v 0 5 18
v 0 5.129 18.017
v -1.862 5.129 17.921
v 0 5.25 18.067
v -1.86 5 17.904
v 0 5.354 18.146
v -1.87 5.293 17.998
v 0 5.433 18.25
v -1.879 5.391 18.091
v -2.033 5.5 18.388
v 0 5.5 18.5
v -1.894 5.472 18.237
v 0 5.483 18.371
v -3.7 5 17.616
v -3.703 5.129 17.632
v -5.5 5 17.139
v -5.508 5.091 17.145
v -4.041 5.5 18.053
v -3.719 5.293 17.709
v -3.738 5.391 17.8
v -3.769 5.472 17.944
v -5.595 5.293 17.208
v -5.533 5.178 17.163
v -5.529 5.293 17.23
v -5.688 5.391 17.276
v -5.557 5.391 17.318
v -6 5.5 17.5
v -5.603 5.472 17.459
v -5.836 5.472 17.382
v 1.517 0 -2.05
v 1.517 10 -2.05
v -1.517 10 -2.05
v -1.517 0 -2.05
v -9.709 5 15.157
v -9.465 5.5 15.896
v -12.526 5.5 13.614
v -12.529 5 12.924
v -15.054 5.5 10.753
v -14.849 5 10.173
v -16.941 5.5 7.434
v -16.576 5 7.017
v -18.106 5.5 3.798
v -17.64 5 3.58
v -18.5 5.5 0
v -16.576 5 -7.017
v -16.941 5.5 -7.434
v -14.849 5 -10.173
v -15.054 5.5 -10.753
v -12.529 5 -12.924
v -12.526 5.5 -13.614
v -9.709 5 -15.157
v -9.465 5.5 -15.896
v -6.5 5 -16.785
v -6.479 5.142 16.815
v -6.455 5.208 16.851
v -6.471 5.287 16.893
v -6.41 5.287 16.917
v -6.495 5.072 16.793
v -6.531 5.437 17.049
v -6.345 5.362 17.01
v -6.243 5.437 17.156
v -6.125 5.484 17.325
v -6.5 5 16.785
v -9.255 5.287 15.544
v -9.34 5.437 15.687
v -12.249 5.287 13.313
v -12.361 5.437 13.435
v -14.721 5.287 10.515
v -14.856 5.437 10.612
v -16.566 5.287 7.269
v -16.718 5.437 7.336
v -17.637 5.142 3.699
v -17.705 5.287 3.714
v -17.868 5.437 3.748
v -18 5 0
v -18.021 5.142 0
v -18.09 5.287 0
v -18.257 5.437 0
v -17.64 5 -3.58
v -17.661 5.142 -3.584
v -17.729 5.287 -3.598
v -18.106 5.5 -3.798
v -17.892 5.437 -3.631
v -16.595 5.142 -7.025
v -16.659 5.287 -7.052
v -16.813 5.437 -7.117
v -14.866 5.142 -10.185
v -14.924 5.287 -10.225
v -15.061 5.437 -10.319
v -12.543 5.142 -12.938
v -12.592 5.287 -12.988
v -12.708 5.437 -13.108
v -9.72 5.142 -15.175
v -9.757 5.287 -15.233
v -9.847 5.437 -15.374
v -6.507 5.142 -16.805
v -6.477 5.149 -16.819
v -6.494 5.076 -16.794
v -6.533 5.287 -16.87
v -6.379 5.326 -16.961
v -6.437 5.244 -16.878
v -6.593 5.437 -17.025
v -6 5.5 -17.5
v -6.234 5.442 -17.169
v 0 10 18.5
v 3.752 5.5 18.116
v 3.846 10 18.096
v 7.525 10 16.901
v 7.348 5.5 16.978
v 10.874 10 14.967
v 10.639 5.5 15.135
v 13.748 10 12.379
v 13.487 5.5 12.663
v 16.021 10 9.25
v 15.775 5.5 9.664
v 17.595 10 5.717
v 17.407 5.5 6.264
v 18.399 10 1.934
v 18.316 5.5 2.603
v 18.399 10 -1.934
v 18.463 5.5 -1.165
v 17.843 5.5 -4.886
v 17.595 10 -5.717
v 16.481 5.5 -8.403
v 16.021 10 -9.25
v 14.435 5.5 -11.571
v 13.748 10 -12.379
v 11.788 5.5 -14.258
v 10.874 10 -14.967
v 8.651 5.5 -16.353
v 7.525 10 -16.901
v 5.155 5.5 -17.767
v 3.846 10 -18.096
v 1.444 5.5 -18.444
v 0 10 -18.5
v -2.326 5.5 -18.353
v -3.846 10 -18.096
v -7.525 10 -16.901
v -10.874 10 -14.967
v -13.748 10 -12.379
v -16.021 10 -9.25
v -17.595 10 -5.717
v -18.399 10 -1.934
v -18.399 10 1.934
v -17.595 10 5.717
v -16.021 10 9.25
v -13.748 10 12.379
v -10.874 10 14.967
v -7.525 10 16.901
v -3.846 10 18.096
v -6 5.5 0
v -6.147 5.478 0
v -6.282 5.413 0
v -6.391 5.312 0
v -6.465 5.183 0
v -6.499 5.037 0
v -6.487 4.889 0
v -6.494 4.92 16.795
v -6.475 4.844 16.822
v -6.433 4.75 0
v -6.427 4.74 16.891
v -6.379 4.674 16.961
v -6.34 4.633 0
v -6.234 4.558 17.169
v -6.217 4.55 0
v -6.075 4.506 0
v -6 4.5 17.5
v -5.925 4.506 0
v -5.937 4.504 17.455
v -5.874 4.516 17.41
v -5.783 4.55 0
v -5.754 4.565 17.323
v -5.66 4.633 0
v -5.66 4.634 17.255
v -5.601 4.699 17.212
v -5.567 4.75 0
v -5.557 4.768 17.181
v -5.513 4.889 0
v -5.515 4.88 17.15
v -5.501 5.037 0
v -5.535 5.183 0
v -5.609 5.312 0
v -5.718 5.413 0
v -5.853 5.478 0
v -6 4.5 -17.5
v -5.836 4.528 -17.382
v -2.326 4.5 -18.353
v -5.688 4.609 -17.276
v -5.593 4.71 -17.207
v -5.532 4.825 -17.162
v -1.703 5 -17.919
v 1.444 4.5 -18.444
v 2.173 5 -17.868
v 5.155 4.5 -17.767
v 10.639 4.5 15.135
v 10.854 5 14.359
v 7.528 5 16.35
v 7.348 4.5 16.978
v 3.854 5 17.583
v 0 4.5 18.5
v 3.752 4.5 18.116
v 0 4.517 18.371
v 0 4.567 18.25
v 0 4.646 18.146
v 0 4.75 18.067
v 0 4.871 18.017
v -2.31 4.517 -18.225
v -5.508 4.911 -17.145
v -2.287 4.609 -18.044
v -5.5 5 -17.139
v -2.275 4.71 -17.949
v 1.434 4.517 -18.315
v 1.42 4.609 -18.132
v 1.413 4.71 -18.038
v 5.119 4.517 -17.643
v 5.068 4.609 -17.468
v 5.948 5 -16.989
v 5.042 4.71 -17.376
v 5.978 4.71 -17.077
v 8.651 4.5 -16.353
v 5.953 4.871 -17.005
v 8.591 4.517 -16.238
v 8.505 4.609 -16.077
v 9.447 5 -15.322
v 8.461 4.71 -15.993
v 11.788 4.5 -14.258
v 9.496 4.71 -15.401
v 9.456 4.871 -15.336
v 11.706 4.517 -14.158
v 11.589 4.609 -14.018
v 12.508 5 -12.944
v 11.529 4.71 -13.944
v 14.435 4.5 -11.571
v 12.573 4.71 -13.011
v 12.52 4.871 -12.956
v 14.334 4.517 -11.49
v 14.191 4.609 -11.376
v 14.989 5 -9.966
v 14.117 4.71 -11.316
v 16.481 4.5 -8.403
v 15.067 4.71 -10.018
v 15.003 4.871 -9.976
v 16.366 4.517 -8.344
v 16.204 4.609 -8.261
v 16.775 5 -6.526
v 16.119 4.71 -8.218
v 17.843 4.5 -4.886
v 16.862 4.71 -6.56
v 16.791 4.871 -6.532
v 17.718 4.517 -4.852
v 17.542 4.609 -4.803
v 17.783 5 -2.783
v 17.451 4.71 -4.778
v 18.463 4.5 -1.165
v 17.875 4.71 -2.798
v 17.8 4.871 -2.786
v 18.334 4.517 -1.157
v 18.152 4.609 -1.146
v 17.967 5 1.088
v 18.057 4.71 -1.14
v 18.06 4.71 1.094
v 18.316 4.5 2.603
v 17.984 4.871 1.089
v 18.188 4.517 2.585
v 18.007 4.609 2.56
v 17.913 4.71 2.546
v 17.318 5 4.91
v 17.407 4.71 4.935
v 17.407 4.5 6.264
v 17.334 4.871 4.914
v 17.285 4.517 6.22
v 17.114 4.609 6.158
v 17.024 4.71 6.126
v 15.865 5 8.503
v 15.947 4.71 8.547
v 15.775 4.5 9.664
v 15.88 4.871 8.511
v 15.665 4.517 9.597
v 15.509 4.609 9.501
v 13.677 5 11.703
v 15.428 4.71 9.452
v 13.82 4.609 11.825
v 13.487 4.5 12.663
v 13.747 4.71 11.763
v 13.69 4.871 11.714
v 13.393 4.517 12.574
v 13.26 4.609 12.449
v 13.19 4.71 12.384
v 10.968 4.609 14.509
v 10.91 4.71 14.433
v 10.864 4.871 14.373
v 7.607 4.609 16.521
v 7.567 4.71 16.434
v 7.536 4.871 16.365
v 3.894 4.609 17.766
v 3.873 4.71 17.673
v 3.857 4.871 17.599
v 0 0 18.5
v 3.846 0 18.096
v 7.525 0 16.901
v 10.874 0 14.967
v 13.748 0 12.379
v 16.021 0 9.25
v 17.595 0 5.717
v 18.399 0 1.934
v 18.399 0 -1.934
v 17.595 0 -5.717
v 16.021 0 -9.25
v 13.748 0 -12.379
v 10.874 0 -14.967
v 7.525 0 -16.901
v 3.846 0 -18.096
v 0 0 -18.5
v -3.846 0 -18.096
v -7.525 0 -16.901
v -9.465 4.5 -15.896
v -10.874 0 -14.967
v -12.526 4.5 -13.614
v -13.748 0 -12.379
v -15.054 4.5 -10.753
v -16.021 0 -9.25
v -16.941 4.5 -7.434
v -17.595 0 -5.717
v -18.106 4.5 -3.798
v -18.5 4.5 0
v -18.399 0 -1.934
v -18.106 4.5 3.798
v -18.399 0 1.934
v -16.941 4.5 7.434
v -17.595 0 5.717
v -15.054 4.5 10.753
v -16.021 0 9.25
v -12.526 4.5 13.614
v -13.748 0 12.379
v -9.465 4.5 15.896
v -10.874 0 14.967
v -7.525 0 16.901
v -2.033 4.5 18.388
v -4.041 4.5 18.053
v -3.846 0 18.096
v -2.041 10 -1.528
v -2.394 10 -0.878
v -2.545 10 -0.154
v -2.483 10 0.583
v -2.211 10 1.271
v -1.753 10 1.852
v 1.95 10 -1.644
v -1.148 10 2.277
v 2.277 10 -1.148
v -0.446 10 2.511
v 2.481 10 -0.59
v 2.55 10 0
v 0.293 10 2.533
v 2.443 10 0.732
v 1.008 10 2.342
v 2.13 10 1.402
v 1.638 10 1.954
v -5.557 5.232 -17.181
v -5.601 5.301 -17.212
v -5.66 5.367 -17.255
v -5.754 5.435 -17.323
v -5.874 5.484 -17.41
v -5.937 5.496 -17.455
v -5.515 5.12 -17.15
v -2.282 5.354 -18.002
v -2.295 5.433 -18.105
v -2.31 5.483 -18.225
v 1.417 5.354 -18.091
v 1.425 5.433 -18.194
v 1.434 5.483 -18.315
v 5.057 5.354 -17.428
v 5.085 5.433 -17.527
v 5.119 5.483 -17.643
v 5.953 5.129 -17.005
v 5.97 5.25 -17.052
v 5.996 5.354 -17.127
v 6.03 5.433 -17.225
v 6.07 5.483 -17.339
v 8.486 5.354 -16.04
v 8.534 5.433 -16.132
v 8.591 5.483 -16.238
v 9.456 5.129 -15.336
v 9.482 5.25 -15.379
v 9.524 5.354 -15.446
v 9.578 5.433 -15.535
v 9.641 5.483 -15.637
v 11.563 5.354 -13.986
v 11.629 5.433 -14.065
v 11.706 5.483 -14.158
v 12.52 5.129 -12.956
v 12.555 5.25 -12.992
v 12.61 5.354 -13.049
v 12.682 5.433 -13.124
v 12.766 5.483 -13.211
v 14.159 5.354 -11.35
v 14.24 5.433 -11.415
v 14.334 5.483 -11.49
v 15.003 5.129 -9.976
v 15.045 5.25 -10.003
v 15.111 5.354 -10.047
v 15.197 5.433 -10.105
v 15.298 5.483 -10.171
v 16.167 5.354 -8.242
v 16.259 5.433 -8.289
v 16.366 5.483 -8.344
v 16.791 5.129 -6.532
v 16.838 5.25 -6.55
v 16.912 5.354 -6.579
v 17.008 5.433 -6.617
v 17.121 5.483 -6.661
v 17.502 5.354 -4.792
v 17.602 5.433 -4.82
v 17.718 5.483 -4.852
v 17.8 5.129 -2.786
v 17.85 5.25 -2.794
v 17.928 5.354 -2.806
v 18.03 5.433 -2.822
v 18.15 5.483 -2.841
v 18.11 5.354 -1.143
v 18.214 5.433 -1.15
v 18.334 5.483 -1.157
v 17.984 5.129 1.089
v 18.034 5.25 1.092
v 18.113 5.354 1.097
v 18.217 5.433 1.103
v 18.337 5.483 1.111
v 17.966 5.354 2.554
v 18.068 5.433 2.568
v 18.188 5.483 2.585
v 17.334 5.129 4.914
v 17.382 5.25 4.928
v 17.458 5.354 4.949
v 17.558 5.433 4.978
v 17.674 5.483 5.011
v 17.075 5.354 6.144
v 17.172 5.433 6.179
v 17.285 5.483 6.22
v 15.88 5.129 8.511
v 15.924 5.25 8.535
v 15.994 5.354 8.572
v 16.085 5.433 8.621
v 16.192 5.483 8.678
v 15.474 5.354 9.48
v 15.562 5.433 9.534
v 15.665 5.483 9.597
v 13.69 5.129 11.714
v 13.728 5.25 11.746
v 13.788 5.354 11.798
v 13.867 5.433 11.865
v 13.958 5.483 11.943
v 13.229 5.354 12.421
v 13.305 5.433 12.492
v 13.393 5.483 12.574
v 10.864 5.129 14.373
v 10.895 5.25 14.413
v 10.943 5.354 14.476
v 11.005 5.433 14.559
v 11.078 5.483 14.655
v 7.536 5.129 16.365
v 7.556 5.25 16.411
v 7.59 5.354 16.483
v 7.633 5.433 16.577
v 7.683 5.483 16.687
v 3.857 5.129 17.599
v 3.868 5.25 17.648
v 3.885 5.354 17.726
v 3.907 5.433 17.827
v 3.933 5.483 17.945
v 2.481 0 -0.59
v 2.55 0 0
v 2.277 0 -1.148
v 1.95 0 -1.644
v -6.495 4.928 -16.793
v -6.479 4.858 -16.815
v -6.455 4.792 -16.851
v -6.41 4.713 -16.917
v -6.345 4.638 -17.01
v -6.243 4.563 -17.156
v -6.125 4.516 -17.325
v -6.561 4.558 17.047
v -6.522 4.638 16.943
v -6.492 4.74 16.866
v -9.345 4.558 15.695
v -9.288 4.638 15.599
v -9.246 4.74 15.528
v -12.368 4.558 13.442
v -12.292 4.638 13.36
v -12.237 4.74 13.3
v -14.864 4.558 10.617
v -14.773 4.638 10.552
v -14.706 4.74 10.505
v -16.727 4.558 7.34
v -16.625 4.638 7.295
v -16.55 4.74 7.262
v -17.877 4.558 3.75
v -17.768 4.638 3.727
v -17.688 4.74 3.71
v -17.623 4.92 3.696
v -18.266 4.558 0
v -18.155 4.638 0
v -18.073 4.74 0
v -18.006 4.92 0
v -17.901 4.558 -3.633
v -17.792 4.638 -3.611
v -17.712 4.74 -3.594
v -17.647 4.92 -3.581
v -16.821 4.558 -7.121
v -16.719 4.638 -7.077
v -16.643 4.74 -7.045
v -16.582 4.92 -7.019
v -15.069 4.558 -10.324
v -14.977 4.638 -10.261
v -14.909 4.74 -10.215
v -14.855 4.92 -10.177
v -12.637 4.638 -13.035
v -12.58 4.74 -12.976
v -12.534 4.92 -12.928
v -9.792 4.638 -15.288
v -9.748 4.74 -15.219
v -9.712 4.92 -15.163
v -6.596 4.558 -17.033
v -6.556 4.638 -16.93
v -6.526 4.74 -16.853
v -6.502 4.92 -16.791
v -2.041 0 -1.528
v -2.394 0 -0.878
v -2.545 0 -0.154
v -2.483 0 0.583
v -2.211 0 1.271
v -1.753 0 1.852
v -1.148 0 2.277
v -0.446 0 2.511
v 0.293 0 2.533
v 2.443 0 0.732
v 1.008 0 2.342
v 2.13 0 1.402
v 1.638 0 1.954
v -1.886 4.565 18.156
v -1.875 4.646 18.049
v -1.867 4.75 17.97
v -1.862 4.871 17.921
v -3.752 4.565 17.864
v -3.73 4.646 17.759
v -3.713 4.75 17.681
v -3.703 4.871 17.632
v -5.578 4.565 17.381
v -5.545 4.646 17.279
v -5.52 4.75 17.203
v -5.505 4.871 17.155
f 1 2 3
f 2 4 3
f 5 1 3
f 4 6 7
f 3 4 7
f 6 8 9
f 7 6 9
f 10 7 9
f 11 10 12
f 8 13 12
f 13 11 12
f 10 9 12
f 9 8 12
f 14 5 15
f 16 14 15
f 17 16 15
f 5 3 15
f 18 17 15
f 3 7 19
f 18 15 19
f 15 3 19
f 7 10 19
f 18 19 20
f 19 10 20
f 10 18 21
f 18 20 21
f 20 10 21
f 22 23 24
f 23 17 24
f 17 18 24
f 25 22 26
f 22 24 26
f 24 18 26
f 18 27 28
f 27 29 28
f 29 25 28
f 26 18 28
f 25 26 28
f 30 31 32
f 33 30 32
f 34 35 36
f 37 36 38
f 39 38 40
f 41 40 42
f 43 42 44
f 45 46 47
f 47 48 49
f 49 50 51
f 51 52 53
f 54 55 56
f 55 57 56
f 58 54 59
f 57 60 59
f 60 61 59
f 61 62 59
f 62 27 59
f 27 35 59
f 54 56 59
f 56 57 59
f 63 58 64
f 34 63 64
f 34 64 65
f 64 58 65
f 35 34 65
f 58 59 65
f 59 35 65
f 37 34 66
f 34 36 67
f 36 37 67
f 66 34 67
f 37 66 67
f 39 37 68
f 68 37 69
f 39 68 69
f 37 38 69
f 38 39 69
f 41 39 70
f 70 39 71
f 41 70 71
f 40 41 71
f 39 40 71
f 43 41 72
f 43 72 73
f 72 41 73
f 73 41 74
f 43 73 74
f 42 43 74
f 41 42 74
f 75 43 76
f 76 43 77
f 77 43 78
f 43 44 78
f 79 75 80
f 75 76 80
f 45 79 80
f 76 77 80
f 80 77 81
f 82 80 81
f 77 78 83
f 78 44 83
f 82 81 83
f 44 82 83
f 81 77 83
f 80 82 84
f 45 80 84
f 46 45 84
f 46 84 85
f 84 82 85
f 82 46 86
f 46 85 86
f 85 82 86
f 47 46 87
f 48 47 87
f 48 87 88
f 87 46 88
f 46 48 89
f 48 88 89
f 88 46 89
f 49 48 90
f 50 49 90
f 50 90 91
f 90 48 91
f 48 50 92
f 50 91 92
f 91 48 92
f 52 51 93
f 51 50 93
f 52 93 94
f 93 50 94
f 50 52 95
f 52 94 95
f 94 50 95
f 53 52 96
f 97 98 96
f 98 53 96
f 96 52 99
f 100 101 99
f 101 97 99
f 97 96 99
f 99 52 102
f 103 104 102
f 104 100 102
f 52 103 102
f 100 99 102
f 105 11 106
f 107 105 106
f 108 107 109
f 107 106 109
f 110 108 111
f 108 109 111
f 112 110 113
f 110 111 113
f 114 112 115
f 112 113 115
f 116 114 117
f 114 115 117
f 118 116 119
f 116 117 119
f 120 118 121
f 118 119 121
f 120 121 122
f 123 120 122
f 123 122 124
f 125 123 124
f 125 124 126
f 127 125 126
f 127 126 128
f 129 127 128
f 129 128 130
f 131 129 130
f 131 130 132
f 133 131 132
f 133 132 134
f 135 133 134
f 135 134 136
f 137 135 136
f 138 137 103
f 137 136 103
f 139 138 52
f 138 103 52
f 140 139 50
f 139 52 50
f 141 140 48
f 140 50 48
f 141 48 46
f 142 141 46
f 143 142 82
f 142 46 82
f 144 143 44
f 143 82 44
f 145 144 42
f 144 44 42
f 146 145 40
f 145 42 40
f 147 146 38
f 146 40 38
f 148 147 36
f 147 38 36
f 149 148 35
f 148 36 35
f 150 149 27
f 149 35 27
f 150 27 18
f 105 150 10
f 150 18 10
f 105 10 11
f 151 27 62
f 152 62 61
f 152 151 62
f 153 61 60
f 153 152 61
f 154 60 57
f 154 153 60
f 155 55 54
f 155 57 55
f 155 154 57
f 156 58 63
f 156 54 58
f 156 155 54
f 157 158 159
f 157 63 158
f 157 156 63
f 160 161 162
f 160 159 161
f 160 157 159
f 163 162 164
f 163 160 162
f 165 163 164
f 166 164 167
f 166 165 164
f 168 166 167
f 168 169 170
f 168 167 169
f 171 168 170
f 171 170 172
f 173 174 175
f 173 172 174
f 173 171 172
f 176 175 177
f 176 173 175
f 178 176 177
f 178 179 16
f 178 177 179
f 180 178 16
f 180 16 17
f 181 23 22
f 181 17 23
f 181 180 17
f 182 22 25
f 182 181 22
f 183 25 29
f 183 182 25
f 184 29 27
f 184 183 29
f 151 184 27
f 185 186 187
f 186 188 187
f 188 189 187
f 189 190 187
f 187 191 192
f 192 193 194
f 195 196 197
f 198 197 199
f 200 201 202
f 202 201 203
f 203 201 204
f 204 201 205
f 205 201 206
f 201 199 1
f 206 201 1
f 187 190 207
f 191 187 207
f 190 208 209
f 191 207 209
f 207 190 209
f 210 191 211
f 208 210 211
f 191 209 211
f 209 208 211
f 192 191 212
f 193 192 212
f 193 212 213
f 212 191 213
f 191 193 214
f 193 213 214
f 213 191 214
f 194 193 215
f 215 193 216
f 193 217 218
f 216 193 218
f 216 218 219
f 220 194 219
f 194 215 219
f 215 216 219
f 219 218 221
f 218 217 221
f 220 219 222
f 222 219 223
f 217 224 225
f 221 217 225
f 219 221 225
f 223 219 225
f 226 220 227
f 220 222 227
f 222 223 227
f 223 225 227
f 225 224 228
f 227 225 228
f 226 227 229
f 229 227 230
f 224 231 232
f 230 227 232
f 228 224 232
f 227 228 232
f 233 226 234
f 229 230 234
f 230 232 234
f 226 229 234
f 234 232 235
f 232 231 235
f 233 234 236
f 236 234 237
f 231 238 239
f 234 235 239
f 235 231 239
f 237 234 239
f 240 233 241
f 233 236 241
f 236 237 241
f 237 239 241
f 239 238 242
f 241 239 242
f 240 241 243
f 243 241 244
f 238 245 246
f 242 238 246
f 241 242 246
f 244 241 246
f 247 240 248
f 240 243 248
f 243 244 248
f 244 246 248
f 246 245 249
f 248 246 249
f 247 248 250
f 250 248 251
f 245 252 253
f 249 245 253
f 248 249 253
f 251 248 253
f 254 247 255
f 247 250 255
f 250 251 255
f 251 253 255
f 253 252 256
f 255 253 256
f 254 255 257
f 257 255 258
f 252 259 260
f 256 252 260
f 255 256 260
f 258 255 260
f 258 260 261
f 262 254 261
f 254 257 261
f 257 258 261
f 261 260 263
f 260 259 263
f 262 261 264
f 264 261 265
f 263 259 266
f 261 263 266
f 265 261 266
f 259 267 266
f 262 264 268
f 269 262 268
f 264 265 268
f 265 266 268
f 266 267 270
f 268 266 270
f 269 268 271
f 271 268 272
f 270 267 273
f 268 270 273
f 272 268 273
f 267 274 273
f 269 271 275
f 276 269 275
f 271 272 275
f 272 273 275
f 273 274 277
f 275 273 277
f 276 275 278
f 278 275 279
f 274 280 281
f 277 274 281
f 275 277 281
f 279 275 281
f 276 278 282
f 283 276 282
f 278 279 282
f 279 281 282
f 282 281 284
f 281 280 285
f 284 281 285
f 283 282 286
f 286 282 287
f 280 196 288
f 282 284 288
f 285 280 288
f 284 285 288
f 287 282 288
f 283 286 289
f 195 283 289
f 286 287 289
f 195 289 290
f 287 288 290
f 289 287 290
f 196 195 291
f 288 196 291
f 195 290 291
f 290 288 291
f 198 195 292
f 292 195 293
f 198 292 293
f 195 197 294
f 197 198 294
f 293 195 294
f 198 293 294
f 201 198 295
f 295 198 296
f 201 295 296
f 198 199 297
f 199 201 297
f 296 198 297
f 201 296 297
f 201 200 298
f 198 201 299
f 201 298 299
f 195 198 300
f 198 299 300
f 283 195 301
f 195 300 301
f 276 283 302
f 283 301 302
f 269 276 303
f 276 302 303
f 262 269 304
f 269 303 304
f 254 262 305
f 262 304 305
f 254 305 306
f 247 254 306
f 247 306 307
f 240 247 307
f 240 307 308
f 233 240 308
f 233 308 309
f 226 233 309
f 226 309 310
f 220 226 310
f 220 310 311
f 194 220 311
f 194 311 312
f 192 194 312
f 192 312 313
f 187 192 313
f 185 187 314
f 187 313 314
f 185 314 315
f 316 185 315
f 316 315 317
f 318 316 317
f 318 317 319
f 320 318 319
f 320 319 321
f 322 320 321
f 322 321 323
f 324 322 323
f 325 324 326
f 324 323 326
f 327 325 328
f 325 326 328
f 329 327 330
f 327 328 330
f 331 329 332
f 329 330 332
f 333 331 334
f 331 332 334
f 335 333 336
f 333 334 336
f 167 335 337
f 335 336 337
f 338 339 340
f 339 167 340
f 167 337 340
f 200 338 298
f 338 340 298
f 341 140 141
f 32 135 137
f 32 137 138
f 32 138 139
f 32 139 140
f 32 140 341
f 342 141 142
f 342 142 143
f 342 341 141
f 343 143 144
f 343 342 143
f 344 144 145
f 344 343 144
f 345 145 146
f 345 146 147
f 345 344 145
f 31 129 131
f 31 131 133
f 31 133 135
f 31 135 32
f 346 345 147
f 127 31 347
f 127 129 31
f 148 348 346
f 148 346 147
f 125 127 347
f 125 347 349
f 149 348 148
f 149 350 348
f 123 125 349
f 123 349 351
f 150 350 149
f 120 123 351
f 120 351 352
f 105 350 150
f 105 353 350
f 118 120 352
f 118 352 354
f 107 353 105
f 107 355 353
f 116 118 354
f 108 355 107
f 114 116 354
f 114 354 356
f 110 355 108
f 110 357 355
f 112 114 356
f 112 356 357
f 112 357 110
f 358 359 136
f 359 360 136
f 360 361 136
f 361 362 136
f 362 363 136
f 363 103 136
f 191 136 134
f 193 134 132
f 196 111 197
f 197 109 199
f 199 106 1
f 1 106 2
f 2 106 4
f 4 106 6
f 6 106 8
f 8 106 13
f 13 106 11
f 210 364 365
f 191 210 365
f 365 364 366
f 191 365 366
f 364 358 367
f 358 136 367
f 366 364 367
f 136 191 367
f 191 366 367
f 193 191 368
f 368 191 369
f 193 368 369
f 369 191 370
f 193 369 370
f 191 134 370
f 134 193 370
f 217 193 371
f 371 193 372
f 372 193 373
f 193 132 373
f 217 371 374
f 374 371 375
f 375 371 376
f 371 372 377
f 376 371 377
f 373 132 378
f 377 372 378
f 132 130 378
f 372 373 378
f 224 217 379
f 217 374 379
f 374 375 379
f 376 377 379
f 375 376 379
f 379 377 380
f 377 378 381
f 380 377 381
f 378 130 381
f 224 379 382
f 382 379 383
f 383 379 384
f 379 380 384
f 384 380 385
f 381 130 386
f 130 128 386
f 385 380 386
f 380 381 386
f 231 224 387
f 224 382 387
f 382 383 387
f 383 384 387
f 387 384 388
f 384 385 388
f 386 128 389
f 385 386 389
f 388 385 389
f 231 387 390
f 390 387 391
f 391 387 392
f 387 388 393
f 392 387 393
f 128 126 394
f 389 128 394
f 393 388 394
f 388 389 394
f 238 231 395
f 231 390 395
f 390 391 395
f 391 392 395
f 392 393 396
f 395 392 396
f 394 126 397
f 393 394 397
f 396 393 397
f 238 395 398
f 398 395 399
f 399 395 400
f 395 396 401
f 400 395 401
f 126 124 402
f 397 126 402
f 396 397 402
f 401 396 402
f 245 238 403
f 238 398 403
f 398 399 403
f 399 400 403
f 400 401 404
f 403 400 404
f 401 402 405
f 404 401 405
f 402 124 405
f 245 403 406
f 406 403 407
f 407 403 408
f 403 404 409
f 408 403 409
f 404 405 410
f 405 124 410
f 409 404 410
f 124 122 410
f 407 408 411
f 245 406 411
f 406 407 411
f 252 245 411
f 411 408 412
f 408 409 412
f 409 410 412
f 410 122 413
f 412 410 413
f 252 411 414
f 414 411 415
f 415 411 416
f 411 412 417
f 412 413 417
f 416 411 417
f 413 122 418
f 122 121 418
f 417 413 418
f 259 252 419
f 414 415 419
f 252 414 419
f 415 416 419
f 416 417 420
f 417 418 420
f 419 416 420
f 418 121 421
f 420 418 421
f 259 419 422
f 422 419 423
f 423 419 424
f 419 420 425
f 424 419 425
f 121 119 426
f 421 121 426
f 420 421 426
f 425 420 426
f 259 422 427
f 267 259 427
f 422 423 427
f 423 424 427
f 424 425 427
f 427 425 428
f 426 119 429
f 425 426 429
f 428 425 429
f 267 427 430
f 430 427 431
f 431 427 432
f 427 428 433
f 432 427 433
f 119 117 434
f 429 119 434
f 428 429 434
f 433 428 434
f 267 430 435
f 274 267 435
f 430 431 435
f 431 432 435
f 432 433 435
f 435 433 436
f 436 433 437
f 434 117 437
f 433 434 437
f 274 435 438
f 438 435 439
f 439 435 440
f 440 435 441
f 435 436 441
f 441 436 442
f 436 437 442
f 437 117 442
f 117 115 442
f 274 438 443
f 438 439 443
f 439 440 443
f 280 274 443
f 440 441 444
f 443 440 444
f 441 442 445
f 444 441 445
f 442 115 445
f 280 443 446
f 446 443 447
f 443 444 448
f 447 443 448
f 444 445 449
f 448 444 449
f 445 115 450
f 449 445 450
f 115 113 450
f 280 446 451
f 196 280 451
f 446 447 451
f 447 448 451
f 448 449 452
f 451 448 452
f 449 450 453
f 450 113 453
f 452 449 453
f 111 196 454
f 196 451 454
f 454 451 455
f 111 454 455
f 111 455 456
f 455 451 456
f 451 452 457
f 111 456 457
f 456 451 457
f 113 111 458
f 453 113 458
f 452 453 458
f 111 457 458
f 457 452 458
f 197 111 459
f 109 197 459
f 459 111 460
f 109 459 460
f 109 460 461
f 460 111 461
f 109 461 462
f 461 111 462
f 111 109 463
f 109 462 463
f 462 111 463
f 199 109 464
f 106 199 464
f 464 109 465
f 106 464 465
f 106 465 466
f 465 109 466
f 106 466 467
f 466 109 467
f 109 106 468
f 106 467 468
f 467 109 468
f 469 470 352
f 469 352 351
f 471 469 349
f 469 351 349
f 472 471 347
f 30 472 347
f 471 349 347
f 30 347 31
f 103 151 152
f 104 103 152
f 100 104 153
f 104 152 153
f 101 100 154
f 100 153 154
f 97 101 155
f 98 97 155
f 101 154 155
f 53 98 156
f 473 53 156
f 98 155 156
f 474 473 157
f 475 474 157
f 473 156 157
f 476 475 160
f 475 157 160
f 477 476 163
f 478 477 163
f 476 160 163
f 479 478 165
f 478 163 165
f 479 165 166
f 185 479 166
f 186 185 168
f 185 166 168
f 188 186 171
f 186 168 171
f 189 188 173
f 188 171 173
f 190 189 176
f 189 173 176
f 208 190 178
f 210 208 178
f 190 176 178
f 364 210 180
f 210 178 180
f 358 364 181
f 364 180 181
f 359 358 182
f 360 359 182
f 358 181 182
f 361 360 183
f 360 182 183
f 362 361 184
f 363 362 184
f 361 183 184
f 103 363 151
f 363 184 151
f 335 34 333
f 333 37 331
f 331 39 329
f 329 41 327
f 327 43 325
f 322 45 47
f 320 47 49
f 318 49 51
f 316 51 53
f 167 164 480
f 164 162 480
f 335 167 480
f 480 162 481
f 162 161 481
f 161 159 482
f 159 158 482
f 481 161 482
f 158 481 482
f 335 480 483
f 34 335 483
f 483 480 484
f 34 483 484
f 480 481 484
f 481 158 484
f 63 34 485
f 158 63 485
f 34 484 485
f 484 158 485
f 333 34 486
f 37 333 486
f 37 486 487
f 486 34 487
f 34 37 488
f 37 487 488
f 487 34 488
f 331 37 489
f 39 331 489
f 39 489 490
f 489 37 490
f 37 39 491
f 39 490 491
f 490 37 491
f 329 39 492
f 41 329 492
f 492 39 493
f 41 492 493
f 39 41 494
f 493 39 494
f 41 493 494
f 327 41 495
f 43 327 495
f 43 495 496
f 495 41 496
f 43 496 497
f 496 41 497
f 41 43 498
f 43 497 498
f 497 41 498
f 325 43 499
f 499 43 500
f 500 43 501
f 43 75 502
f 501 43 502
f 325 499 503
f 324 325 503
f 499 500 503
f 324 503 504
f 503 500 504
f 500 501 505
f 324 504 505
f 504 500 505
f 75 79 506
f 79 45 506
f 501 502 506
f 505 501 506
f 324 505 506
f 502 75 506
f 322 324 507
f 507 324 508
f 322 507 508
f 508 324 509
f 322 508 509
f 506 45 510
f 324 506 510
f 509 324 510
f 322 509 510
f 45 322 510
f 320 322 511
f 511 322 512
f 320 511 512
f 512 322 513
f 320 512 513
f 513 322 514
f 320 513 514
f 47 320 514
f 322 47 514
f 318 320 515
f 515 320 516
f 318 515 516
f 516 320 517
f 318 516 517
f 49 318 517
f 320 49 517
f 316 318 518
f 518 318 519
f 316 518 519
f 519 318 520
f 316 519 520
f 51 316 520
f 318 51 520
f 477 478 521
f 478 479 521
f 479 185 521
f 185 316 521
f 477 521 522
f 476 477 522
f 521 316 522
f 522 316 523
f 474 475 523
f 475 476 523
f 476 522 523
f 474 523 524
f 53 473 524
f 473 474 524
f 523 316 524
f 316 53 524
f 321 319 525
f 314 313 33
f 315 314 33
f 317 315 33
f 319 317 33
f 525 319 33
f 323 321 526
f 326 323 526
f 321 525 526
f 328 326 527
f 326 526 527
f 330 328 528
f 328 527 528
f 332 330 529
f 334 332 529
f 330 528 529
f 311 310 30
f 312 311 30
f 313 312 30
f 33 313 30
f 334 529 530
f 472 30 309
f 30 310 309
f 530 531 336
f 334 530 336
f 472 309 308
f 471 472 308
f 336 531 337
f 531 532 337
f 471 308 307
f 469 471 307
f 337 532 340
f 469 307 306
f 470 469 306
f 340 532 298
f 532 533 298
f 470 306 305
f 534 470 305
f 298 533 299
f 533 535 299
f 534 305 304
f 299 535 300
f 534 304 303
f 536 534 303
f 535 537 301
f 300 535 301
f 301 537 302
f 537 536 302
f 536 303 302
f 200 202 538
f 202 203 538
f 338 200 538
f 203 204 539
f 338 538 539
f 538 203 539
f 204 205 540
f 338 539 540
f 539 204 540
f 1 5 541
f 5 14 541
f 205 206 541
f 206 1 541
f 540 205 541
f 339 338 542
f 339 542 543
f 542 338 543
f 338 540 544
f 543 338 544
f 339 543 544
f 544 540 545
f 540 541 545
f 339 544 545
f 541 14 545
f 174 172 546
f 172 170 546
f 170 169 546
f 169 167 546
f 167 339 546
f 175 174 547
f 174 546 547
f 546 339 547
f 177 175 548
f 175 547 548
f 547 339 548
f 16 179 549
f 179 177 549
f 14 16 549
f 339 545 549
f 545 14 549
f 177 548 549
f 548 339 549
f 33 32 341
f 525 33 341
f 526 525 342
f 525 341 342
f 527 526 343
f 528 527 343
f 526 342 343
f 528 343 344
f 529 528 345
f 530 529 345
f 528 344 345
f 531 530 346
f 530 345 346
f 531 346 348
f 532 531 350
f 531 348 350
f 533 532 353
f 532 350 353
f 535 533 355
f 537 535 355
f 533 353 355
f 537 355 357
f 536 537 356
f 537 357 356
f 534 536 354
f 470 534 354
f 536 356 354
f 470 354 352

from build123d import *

# Parameters (mm, degrees)
SKETCH1_R                                 = 18.5
BOSS_EXTRUDE1_DEPTH                       = 10
SKETCH2_R                                 = 0.5
CUT_EXTRUDE1_REACH                        = 30.009
CUT_EXTRUDE2_REACH                        = 30.009
CUT_EXTRUDE2_END_MAJOR_RADIUS             = 18.5
CUT_EXTRUDE2_END_MINOR_RADIUS             = 0.5
SKETCH4_R                                 = 0.5
CUT_EXTRUDE2_DIRECTION_2_REACH            = 30.009
CUT_EXTRUDE2_DIRECTION_2_END_MAJOR_RADIUS = 18.5
CUT_EXTRUDE2_DIRECTION_2_END_MINOR_RADIUS = 0.5


with BuildPart() as part:
    # Sketch1 → Boss-Extrude1 (new body)
    with BuildSketch(Plane(origin=(0, 0, 0), x_dir=(1, 0, 0), z_dir=(0, 1, 0))):
        with Locations(Location((0, 0, 0), (0, 0, 270))):
            Circle(SKETCH1_R)
    extrude(amount=BOSS_EXTRUDE1_DEPTH)

    # Sketch2 → Cut-Revolve1 (revolve, cut)
    with BuildSketch(Plane.XY, mode=Mode.PRIVATE) as cut_revolve1_sk:
        with Locations((-18.5, 5)):
            Circle(SKETCH2_R)
    revolve(cut_revolve1_sk.sketch.rotate(Axis((0, 22.422972825, 0), (0, -1, 0)), 270), axis=Axis((0, 22.422972825, 0), (0, -1, 0)), mode=Mode.SUBTRACT)

    # Sketch3 → Cut-Extrude1 (cut, up to next)
    with BuildSketch(Plane(origin=(0, 10, 0), x_dir=(1, 0, 0), z_dir=(0, 1, 0)), mode=Mode.PRIVATE) as cut_extrude1_sk1:
        with BuildLine():
            Line((1.516575089, 2.05), (-1.516575089, 2.05))
            ThreePointArc((-1.516575089, 2.05), (-1.147874889, -2.277033868), (2.55, 0))
            ThreePointArc((2.55, 0), (2.277033868, 1.147874889), (1.516575089, 2.05))
        make_face()
    cut_extrude1_tool1 = extrude(cut_extrude1_sk1.sketch, amount=-CUT_EXTRUDE1_REACH, mode=Mode.PRIVATE) & part.part
    add(cut_extrude1_tool1.solids().sort_by_distance((0, 10, 0.119895))[0], mode=Mode.SUBTRACT)

    # Cut-Extrude2: up to this torus (the profile starts outside it)
    cut_extrude2_end = Plane(origin=(0, 5, 0), z_dir=(0, 1, 0)) * Torus(CUT_EXTRUDE2_END_MAJOR_RADIUS, CUT_EXTRUDE2_END_MINOR_RADIUS, mode=Mode.PRIVATE)
    # Sketch4 → Cut-Extrude2 (cut, up to the surface)
    with BuildSketch(Plane.XY, mode=Mode.PRIVATE) as cut_extrude2_sk1:
        with Locations(Location((-6, 5, 0), (0, 0, 90))):
            Circle(SKETCH4_R)
    cut_extrude2_tool1 = extrude(cut_extrude2_sk1.sketch, amount=-CUT_EXTRUDE2_REACH, mode=Mode.PRIVATE) - cut_extrude2_end
    add(cut_extrude2_tool1.solids().sort_by_distance((-6, 5, 0))[0], mode=Mode.SUBTRACT)

    # Cut-Extrude2 direction 2: up to this torus (the profile starts outside it)
    cut_extrude2_direction_2_end = Plane(origin=(0, 5, 0), z_dir=(0, 1, 0)) * Torus(CUT_EXTRUDE2_DIRECTION_2_END_MAJOR_RADIUS, CUT_EXTRUDE2_DIRECTION_2_END_MINOR_RADIUS, mode=Mode.PRIVATE)
    # Sketch4 → Cut-Extrude2 direction 2 (cut, up to the surface)
    with BuildSketch(Plane.XY, mode=Mode.PRIVATE) as cut_extrude2_direction_2_sk1:
        with Locations(Location((-6, 5, 0), (0, 0, 90))):
            Circle(SKETCH4_R)
    cut_extrude2_direction_2_tool1 = extrude(cut_extrude2_direction_2_sk1.sketch, amount=CUT_EXTRUDE2_DIRECTION_2_REACH, mode=Mode.PRIVATE) - cut_extrude2_direction_2_end
    add(cut_extrude2_direction_2_tool1.solids().sort_by_distance((-6, 5, 0))[0], mode=Mode.SUBTRACT)


solid = part.part
